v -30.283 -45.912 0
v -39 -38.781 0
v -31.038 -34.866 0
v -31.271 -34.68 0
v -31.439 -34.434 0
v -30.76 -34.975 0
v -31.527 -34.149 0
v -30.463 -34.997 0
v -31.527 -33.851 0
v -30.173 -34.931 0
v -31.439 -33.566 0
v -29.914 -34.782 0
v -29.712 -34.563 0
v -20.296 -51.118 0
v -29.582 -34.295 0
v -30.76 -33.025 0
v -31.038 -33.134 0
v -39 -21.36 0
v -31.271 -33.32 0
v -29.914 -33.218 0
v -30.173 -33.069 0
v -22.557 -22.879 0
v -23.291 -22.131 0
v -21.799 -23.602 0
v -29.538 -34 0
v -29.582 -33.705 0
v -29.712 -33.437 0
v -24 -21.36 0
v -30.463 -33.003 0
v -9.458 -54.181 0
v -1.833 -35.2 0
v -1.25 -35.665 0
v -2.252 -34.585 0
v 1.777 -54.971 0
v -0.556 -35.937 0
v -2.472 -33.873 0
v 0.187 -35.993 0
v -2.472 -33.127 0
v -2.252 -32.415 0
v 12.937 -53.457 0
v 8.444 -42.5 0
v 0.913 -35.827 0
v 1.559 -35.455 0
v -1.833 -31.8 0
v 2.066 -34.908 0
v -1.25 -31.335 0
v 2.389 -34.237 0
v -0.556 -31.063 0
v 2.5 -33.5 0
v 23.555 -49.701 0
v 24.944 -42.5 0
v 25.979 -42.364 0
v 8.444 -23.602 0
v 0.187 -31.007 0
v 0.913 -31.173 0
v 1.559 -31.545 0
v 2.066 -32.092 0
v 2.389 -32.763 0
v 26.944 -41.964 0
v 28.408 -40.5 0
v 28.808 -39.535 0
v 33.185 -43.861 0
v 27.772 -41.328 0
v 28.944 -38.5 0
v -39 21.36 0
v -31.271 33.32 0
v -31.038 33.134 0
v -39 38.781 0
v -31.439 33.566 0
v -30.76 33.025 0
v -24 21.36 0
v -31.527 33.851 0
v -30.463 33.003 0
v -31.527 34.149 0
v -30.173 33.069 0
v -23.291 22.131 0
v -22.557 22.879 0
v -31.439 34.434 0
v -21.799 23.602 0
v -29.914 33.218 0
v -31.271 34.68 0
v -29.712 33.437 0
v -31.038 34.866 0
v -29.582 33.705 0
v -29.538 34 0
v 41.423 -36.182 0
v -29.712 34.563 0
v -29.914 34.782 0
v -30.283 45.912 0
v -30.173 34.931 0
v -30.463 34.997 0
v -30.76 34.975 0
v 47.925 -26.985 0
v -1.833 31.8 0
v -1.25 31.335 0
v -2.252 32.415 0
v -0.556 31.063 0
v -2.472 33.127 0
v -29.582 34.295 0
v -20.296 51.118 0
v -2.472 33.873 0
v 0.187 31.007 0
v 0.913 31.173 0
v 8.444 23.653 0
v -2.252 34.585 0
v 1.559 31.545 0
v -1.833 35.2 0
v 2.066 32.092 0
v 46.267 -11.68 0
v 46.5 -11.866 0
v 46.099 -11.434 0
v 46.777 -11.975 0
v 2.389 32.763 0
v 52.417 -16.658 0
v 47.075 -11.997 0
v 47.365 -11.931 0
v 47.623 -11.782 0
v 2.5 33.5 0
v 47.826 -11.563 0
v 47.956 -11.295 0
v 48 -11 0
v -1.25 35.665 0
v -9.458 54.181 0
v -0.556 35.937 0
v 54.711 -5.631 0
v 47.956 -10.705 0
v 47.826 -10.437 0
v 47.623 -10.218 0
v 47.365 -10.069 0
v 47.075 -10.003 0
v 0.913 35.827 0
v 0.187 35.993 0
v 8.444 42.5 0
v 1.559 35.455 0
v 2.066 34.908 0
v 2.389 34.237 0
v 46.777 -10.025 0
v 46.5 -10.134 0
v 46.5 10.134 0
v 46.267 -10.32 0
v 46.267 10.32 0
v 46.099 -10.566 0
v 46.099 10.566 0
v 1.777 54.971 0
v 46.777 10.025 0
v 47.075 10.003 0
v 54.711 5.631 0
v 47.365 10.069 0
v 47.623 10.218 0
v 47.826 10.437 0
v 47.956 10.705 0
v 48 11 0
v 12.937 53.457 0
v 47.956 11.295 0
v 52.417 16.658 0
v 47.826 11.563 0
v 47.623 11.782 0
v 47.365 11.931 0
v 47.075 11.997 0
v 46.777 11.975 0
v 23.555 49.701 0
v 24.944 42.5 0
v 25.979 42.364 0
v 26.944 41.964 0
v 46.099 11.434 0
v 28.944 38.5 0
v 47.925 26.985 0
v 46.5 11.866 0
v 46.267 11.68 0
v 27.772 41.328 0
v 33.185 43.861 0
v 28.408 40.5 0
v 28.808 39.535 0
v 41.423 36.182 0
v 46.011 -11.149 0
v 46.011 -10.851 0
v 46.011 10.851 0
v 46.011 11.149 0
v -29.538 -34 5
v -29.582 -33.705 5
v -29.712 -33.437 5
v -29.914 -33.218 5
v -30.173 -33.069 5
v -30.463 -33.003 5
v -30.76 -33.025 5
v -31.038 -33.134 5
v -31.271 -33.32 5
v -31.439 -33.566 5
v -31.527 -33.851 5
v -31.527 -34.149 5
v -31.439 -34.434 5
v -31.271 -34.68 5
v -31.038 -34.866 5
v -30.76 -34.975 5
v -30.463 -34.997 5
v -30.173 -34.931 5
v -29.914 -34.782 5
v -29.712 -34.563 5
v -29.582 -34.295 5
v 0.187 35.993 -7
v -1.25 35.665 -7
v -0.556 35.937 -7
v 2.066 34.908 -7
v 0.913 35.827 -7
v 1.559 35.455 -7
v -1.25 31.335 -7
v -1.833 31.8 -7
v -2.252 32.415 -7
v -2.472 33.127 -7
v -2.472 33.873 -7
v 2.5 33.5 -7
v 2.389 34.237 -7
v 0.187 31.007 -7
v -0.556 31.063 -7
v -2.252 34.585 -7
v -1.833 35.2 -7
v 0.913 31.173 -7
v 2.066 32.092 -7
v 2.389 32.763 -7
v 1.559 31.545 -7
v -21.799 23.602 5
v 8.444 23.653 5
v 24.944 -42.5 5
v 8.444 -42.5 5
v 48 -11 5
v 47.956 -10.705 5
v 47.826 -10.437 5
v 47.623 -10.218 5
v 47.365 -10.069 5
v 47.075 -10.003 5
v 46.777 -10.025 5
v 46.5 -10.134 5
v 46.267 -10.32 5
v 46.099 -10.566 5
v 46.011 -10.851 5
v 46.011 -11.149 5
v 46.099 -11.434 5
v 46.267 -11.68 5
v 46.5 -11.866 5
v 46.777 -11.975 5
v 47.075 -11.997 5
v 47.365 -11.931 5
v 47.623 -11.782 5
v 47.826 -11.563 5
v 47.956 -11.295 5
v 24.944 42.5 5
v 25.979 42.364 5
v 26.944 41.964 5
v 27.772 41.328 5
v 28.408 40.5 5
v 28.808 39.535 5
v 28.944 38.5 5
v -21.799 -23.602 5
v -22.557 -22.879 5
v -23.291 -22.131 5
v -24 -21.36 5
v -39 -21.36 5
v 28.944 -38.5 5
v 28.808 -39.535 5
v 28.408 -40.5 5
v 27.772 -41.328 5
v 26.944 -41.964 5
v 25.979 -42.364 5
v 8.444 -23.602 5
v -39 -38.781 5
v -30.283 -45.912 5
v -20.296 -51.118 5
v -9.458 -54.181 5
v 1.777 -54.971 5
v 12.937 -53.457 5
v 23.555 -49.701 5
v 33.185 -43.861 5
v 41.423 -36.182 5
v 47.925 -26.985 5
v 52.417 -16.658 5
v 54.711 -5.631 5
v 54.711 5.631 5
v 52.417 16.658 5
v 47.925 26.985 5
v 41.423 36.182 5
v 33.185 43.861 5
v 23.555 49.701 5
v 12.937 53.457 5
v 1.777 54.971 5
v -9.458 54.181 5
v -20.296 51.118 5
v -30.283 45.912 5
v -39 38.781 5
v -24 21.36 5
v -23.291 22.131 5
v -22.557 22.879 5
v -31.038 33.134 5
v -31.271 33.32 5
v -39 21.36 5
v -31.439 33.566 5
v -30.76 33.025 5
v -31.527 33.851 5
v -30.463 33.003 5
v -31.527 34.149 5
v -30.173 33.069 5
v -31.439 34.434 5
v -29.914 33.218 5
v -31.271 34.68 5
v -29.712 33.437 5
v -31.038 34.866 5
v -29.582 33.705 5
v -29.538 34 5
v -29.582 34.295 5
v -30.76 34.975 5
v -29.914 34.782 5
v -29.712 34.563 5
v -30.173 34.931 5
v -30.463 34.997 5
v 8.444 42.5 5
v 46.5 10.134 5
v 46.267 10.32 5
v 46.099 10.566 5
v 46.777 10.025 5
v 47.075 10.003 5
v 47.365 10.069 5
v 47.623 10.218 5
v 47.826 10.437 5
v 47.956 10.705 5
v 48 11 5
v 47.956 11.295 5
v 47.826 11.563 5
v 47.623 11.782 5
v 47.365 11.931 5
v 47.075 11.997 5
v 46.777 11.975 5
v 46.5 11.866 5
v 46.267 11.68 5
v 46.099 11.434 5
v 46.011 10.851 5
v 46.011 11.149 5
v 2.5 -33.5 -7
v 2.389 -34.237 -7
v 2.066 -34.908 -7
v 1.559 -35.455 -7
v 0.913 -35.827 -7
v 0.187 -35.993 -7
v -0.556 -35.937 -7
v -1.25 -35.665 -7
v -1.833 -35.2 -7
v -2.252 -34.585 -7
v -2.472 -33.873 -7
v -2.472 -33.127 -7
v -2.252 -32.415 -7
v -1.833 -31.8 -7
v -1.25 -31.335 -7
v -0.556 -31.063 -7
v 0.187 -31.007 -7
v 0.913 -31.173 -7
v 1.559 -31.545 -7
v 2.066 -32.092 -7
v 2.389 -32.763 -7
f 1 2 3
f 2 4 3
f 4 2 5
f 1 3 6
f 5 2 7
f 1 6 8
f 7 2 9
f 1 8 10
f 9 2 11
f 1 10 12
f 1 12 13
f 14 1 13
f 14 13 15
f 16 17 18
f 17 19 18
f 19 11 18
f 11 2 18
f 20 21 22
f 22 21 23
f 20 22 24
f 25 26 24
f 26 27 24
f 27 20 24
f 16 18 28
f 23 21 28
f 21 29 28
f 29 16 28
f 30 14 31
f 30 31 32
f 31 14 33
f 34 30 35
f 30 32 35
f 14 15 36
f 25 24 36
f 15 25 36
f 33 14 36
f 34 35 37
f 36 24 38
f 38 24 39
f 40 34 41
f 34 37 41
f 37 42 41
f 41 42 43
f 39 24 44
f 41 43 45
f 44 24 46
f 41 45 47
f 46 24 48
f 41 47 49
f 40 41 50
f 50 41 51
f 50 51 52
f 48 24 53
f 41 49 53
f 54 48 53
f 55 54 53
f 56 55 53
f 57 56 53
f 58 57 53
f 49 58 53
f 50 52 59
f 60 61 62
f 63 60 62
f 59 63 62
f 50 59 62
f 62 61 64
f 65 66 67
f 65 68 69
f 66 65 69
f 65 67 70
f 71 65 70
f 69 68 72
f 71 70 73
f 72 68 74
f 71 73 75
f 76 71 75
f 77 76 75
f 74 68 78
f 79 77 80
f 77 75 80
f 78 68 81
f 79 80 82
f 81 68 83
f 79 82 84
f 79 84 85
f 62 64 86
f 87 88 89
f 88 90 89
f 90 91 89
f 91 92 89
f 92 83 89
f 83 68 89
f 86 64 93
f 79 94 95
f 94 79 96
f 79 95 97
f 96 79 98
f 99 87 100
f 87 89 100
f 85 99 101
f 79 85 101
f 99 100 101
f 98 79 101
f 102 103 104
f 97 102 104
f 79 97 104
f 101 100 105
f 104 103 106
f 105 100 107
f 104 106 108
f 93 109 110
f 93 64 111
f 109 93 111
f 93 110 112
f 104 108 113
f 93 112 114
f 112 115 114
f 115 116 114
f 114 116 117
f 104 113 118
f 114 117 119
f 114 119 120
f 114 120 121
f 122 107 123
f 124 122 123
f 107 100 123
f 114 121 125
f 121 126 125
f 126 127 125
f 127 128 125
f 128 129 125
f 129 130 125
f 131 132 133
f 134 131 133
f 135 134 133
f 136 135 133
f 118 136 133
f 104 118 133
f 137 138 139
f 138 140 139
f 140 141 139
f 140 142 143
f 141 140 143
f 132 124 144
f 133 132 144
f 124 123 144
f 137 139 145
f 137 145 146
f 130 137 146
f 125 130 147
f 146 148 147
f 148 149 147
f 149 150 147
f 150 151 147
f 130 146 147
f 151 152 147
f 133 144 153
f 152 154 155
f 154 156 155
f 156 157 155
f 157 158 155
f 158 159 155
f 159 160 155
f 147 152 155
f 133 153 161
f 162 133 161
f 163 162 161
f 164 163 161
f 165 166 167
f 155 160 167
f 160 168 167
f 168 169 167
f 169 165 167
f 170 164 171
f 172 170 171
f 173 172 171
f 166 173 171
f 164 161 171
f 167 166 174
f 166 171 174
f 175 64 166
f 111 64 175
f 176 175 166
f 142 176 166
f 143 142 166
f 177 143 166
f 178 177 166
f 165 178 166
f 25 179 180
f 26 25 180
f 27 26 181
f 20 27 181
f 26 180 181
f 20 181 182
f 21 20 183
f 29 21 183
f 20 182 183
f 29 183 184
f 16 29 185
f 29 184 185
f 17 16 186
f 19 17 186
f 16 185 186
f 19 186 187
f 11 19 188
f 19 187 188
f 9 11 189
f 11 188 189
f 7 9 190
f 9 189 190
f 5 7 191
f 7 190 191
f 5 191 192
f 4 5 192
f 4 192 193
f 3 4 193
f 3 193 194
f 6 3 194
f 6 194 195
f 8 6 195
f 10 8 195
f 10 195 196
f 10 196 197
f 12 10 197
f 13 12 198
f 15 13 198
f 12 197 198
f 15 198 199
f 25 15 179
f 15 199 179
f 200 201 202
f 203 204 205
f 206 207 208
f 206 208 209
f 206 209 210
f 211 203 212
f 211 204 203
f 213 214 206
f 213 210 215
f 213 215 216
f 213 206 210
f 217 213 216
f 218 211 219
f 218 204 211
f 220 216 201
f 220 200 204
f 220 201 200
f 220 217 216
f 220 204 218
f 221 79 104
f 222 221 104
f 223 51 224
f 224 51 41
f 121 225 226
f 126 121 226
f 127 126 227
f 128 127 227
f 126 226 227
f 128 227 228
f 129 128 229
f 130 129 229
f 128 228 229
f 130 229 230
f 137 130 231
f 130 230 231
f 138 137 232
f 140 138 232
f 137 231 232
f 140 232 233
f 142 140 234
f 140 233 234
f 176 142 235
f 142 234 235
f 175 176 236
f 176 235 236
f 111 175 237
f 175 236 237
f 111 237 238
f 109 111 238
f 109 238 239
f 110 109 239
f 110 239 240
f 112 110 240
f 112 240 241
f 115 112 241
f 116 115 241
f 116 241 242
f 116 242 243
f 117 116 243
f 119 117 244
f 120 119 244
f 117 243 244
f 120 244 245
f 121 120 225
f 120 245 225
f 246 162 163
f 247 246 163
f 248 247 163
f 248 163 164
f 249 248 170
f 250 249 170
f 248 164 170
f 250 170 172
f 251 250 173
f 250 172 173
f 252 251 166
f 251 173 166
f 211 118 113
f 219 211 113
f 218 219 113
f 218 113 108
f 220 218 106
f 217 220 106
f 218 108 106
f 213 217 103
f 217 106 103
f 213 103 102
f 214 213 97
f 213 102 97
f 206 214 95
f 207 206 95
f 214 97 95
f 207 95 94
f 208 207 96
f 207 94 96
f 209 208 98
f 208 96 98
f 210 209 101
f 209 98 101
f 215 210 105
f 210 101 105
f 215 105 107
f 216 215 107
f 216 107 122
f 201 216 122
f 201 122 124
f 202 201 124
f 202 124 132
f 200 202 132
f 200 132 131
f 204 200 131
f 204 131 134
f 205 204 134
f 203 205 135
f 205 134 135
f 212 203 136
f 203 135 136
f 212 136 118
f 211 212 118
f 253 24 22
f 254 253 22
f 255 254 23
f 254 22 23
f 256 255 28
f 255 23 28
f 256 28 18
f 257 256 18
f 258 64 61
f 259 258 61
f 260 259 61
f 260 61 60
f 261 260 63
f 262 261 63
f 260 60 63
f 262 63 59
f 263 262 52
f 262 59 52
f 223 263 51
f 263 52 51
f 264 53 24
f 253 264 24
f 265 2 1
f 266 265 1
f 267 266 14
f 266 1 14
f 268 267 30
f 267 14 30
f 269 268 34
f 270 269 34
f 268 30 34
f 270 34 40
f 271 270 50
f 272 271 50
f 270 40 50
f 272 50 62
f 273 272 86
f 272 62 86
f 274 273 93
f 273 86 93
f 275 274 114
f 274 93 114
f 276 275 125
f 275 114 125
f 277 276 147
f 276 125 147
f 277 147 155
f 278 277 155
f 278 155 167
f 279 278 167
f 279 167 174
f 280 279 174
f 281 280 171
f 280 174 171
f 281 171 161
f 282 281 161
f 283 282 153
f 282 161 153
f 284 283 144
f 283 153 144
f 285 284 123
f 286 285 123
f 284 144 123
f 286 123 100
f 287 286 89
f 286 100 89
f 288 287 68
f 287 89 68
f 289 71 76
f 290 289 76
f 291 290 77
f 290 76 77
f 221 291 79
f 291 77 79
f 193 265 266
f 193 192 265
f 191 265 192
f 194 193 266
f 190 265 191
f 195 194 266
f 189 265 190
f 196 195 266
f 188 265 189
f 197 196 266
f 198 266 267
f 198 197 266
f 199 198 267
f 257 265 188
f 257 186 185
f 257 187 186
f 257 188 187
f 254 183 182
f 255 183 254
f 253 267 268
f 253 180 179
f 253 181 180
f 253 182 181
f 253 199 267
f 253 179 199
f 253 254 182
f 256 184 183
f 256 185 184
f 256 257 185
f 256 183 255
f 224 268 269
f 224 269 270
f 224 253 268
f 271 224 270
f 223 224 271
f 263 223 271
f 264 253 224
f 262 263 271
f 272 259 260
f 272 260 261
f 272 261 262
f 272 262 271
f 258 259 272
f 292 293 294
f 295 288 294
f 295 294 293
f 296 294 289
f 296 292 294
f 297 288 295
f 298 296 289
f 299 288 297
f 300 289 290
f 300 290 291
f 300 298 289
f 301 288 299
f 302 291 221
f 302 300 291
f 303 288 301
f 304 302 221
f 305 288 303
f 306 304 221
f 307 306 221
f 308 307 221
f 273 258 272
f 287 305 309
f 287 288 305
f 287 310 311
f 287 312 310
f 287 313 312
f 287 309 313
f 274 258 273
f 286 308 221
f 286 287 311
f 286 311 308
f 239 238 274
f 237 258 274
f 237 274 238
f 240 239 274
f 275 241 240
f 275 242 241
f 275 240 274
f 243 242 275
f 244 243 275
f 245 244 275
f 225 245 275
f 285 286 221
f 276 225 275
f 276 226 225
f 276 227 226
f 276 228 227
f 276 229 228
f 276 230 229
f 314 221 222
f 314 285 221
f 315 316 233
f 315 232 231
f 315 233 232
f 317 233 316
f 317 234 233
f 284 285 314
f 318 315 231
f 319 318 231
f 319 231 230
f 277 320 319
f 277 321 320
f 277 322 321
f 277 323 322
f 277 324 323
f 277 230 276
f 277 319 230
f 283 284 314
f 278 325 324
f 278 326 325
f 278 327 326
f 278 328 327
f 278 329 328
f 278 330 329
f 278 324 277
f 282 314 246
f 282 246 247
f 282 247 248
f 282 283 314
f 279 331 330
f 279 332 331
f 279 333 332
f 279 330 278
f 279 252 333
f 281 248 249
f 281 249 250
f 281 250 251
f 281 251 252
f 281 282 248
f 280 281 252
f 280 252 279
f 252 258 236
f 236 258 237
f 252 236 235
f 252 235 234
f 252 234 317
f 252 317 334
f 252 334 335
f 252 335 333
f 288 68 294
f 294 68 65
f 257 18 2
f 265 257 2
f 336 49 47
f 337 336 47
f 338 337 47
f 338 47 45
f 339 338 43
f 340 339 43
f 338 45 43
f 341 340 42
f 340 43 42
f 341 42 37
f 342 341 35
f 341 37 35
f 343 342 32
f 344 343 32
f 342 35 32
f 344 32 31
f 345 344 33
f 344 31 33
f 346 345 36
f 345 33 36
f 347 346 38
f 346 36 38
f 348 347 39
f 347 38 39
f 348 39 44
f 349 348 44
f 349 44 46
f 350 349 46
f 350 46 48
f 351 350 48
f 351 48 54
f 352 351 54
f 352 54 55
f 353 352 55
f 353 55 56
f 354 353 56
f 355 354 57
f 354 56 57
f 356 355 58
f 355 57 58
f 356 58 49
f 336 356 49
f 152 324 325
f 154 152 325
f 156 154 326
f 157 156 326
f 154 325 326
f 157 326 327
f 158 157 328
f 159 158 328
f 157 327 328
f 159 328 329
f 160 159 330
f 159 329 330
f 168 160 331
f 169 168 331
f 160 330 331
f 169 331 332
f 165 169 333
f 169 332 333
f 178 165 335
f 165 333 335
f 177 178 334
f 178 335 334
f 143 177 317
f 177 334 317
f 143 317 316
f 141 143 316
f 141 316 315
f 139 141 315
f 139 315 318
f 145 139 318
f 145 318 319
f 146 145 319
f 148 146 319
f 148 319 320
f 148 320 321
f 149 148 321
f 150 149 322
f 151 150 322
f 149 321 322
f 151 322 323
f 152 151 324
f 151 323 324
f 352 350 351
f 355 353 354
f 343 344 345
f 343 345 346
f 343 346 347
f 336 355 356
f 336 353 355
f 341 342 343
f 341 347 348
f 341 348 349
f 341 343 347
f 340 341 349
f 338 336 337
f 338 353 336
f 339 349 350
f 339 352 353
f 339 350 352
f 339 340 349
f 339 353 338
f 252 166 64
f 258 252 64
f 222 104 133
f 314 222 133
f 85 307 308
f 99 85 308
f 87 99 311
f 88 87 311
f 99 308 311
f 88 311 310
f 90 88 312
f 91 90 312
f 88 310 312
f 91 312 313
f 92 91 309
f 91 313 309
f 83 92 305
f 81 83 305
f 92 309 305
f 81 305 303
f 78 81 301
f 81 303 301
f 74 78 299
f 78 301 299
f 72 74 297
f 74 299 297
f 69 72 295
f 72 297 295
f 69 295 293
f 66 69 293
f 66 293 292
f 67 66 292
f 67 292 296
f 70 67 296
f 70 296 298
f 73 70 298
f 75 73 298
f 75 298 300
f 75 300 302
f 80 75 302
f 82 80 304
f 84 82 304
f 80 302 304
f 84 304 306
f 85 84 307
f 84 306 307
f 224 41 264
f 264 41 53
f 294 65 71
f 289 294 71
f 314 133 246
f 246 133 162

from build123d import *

# Parameters (mm, degrees)
BOSS_EXTRUDE1_DEPTH = 5
SKETCH2_R           = 2.5
BOSS_EXTRUDE2_DEPTH = 7
SKETCH3_R           = 1
CUT_EXTRUDE1_DEPTH  = 5


with BuildPart() as part:
    # Sketch1 → Boss-Extrude1 (new body)
    with BuildSketch(Plane.XY):
        with BuildLine():
            Line((8.444274161, -42.5), (8.444274161, -23.602240521))
            Line((8.444274161, -23.602240521), (-13.047599403, -23.602240521))
            Line((-13.047599403, -23.602240521), (-21.798721118, -23.602240521))
            ThreePointArc((-21.798721118, -23.602240521), (-22.926788134, -22.508051578), (-24, -21.360009363))
            Line((-24, -21.360009363), (-39, -21.360009363))
            Line((-39, -21.360009363), (-39, -38.781438859))
            ThreePointArc((-39, -38.781438859), (55, 0), (-39, 38.781438859))
            Line((-39, 38.781438859), (-39, 21.360009363))
            Line((-39, 21.360009363), (-24, 21.360009363))
            ThreePointArc((-24, 21.360009363), (-22.926788134, 22.508051578), (-21.798721118, 23.602240521))
            Line((-21.798721118, 23.602240521), (8.444274161, 23.653441006))
            Line((8.444274161, 23.653441006), (8.444274161, 42.5))
            Line((8.444274161, 42.5), (24.94401824, 42.5))
            ThreePointArc((24.94401824, 42.5), (27.772445365, 41.328427125), (28.94401824, 38.5))
            Line((28.94401824, 38.5), (28.94401824, -38.5))
            ThreePointArc((28.94401824, -38.5), (27.772445365, -41.328427125), (24.94401824, -42.5))
            Line((24.94401824, -42.5), (8.444274161, -42.5))
        make_face()
    extrude(amount=BOSS_EXTRUDE1_DEPTH)

    # Sketch2 → Boss-Extrude2 (add)
    with BuildSketch(Plane(origin=(0, 0, 0), x_dir=(-1, 0, 0), z_dir=(0, 0, -1))):
        with Locations(Location((0, -33.5, 0), (0, 0, 180))):
            Circle(SKETCH2_R)
        with Locations(Location((0, 33.5, 0), (0, 0, 180))):
            Circle(SKETCH2_R)
    extrude(amount=BOSS_EXTRUDE2_DEPTH)

    # Sketch3 → Cut-Extrude1 (cut)
    with BuildSketch(Plane.XY.offset(5)):
        with Locations((-30.537878891, -34)):
            Circle(SKETCH3_R)
        with Locations((-30.537878891, 34)):
            Circle(SKETCH3_R)
        with Locations((47, 11)):
            Circle(SKETCH3_R)
        with Locations((47, -11)):
            Circle(SKETCH3_R)
    extrude(amount=-CUT_EXTRUDE1_DEPTH, mode=Mode.SUBTRACT)


solid = part.part
